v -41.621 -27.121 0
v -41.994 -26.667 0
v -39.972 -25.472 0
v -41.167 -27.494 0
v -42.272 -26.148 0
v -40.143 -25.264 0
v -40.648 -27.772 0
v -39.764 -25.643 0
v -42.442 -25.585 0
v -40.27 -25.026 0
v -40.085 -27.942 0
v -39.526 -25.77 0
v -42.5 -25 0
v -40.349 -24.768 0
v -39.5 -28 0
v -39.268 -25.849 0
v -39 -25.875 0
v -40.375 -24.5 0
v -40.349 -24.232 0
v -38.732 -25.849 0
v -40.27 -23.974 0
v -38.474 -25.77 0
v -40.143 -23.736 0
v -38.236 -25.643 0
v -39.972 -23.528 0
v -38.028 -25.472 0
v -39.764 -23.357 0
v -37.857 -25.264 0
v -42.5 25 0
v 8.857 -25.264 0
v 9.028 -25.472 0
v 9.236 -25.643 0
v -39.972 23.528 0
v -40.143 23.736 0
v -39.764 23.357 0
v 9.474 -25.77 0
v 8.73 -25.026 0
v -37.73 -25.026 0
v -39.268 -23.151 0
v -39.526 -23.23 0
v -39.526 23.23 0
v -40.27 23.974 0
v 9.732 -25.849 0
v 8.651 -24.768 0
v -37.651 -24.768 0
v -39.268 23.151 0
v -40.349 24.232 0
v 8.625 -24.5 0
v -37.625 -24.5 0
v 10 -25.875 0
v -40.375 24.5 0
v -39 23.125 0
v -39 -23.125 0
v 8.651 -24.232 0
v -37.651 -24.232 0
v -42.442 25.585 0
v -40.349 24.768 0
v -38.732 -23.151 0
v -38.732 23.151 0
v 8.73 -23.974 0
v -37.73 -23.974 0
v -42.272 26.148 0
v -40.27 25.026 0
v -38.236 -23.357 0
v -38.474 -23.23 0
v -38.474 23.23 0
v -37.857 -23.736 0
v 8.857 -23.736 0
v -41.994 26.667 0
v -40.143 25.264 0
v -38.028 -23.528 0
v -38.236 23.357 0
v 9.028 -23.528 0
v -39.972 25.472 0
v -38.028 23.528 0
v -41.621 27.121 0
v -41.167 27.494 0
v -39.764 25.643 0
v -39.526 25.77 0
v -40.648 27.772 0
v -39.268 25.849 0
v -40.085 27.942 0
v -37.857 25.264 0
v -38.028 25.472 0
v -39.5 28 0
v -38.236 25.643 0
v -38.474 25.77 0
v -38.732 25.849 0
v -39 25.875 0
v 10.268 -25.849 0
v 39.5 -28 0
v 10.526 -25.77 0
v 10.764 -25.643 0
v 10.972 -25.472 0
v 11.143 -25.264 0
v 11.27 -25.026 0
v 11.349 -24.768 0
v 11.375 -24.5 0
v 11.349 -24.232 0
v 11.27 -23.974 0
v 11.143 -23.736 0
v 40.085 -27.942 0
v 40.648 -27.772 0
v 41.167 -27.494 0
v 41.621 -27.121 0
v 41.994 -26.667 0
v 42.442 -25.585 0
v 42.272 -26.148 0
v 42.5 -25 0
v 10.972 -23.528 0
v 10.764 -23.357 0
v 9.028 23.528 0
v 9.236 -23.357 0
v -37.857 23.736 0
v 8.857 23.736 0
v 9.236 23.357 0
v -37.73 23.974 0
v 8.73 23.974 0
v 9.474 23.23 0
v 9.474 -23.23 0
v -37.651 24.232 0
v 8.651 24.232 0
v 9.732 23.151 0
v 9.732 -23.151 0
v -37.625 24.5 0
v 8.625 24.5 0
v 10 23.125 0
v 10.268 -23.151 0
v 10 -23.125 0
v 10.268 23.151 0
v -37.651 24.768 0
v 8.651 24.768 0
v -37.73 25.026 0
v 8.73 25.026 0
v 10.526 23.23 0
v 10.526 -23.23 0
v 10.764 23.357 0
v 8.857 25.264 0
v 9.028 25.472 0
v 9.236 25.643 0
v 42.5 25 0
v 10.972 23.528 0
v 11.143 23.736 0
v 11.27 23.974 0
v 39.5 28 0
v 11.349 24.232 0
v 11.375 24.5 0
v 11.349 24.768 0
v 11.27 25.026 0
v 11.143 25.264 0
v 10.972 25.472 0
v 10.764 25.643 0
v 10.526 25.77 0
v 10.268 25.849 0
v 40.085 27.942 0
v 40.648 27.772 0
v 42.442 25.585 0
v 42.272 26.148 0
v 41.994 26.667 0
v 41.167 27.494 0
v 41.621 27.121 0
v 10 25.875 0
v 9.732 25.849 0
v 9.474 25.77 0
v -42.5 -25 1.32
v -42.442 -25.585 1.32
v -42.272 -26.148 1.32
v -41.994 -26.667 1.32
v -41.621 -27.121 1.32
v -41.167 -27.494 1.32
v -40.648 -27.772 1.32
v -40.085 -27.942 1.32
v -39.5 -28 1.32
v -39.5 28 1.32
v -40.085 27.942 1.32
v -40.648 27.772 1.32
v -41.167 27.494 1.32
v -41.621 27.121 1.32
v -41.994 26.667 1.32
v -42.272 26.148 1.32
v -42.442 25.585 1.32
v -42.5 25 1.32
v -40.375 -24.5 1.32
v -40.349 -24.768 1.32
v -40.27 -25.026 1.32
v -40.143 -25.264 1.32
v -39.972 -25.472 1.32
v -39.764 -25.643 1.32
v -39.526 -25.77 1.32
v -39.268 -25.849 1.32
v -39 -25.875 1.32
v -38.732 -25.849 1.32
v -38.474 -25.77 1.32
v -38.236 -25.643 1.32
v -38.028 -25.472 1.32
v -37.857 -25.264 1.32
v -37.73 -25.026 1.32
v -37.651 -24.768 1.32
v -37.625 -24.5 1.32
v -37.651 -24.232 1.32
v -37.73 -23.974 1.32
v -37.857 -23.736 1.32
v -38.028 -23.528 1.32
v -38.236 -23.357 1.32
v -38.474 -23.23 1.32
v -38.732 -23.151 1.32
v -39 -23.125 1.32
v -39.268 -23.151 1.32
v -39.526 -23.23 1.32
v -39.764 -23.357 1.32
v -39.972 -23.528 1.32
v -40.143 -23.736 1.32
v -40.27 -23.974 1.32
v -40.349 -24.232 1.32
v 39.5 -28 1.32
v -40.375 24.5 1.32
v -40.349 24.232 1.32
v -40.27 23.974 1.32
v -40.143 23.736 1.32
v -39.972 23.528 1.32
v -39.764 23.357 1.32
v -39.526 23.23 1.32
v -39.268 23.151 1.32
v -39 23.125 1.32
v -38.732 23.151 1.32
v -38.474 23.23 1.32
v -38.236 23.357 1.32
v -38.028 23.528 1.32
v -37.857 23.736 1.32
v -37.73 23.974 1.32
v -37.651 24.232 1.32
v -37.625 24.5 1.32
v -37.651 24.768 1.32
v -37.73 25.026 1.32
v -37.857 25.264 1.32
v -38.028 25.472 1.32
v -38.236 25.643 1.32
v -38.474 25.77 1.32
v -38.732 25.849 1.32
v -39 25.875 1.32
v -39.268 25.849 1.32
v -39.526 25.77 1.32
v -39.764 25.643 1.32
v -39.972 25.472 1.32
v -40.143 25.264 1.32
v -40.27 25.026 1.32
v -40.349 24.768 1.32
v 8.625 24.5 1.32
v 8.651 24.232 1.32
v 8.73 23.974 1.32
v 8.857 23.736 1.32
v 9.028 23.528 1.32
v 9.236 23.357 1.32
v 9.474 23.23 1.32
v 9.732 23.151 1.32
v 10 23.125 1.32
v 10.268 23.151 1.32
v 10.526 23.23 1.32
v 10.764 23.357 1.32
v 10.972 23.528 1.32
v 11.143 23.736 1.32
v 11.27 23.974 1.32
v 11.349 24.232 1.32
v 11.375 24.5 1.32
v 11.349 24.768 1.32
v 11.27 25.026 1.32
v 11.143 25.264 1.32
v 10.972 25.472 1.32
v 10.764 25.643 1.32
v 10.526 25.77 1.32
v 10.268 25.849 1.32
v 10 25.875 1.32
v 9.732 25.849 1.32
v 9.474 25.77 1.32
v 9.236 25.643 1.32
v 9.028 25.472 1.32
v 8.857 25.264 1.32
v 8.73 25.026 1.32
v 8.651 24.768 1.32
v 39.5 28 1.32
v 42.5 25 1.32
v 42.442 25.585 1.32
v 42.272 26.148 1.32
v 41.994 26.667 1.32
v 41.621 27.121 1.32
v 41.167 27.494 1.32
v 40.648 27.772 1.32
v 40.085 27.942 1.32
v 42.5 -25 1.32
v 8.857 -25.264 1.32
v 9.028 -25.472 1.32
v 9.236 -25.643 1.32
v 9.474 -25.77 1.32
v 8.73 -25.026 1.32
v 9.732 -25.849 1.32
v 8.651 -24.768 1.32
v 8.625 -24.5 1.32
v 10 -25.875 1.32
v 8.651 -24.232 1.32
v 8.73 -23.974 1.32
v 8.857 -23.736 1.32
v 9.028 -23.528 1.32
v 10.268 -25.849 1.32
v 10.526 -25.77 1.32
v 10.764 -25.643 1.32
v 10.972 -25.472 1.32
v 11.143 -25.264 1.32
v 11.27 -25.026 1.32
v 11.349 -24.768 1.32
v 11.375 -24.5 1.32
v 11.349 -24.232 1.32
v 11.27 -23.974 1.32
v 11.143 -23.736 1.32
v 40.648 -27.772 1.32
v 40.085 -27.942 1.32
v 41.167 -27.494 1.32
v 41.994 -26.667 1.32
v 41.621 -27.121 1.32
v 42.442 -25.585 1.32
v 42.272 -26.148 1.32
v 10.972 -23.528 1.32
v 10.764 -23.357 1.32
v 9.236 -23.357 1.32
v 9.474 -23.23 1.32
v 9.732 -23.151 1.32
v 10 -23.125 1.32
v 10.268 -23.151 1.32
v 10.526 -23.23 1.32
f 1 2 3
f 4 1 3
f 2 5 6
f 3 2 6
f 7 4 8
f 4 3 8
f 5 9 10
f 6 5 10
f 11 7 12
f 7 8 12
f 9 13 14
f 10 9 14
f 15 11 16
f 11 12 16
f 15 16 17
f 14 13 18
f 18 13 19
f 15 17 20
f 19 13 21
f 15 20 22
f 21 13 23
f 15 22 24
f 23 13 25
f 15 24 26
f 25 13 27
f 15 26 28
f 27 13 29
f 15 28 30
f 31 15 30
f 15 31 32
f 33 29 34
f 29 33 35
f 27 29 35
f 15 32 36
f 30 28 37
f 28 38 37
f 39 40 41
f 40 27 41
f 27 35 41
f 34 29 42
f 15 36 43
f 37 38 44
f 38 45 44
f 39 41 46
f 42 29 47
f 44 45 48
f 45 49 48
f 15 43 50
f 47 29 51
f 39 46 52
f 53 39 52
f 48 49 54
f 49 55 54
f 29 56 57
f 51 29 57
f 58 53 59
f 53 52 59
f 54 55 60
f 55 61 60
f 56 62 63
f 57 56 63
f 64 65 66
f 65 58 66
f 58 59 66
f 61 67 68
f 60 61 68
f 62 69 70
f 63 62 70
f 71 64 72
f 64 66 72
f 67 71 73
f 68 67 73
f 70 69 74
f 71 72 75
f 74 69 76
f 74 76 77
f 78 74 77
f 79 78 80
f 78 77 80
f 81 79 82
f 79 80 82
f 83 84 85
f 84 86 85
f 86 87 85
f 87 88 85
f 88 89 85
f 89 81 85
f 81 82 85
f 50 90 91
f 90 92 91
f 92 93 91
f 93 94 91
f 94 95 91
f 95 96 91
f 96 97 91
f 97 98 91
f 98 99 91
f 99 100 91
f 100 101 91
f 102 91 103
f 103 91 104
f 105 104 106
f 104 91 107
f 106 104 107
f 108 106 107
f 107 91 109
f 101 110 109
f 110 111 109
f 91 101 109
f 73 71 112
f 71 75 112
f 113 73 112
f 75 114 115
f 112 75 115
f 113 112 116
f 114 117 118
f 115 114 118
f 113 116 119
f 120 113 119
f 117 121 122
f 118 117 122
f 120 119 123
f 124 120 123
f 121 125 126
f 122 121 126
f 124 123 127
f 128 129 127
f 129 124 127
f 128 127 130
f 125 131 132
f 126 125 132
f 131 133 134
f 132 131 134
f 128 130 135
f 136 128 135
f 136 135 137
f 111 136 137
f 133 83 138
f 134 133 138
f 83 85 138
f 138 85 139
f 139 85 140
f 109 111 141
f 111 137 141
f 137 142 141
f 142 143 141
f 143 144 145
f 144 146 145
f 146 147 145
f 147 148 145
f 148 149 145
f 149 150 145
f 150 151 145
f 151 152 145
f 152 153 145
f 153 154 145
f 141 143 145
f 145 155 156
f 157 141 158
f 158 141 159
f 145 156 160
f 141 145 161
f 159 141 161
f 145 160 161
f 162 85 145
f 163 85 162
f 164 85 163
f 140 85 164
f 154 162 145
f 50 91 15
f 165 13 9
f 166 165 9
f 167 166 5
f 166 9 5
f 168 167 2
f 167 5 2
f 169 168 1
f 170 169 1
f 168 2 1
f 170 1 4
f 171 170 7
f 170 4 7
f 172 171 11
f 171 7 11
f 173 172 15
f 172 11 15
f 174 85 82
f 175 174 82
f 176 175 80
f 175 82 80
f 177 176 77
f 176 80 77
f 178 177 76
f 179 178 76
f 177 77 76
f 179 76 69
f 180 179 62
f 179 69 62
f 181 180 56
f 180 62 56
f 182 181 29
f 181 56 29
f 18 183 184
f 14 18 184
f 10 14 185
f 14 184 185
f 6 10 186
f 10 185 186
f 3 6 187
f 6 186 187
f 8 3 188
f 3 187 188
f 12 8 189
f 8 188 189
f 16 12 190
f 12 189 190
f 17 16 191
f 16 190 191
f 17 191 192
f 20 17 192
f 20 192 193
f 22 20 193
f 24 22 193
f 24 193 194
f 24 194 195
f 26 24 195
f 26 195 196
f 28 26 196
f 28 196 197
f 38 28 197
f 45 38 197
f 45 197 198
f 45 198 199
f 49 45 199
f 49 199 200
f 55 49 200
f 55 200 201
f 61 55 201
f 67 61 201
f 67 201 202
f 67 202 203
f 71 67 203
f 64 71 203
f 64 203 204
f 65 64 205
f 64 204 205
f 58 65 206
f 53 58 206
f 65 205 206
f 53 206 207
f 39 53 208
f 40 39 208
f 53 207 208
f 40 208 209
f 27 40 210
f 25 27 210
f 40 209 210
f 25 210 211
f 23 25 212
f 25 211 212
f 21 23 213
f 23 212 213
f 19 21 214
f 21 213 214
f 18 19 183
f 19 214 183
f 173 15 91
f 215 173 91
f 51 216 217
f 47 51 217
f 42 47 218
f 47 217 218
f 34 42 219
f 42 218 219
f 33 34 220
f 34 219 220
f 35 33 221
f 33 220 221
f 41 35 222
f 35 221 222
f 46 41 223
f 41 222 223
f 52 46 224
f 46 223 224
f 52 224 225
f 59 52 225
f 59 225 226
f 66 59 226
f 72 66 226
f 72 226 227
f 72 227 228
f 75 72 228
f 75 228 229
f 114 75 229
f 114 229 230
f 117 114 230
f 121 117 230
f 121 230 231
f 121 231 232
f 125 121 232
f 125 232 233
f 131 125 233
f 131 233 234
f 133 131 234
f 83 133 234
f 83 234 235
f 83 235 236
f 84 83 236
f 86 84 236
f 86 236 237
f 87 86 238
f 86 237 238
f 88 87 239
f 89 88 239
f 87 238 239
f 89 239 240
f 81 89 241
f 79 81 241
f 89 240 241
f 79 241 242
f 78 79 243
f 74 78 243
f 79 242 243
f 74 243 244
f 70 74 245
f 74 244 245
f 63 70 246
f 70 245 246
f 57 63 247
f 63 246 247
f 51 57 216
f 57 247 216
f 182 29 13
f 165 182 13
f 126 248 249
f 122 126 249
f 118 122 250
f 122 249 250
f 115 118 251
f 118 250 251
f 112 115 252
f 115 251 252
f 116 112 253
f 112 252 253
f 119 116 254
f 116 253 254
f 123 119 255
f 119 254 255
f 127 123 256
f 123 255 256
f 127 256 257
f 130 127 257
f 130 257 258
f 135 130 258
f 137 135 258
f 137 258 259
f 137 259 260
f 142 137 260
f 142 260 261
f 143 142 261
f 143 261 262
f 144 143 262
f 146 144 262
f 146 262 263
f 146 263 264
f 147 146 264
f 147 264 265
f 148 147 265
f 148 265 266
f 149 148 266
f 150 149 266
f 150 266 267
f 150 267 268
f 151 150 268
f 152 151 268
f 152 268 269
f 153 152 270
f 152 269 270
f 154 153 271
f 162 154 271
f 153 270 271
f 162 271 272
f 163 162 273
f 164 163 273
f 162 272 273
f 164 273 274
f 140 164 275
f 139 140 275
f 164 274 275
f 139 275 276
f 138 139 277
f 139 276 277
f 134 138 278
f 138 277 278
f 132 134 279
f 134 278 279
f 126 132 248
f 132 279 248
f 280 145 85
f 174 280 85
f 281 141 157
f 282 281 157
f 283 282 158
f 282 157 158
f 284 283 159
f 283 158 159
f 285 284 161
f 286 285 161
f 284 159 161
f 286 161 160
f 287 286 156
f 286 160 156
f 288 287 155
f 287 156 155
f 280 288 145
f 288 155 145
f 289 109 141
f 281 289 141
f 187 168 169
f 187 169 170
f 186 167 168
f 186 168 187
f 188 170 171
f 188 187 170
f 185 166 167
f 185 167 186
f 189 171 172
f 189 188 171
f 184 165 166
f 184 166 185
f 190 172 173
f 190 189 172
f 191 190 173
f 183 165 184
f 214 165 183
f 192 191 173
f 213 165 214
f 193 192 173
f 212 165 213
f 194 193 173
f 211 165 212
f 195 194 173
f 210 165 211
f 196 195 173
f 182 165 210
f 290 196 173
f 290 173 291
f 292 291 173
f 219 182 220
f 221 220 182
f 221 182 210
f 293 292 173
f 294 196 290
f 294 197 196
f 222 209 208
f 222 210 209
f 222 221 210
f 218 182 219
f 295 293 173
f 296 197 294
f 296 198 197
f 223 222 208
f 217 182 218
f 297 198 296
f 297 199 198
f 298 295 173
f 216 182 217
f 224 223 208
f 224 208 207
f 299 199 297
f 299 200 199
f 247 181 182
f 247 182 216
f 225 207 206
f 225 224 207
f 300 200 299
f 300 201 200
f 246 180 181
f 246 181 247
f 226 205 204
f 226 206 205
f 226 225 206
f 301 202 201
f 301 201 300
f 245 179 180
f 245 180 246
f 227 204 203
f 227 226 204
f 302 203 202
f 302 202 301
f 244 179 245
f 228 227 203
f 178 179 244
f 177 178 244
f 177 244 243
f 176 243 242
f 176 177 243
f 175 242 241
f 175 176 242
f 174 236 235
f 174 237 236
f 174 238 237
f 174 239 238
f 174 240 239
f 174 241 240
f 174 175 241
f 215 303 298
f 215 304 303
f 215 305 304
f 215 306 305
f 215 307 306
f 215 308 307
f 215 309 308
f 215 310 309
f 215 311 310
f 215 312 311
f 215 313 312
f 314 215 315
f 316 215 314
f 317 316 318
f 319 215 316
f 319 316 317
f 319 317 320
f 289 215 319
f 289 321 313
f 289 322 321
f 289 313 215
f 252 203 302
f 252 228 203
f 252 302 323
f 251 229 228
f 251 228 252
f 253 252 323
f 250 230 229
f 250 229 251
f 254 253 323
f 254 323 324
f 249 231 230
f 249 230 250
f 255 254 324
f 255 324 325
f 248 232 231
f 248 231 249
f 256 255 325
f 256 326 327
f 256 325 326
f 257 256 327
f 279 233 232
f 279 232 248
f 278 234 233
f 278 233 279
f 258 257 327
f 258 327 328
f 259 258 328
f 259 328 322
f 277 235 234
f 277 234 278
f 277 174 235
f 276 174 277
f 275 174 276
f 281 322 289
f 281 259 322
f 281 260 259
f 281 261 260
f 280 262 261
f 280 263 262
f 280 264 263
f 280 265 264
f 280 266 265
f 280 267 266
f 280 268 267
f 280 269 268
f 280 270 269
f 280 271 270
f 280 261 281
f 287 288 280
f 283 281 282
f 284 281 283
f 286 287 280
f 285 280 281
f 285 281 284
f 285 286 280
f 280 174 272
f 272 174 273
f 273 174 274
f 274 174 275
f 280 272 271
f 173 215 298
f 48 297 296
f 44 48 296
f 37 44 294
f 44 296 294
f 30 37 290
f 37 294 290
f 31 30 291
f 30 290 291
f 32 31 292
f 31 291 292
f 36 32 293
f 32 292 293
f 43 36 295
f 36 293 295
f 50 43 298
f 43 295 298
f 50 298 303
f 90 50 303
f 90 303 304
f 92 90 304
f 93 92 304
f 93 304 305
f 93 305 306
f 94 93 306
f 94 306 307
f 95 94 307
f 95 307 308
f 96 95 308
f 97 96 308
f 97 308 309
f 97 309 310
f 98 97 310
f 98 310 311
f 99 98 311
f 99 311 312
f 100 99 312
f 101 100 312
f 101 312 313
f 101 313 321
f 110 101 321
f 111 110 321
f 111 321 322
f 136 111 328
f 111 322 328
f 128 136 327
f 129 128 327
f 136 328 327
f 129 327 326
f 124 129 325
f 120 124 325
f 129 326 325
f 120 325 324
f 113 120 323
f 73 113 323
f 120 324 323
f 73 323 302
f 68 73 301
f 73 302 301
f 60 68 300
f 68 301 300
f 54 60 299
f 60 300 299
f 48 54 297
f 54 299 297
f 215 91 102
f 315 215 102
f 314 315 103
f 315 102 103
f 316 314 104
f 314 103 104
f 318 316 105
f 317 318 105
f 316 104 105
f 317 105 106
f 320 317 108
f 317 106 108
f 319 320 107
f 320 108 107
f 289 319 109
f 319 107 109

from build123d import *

# Parameters (mm, degrees)
F1_DEPTH = 1.32
F2_D     = 2.75


with BuildPart() as f1:
    # F0 (on Top) → F1 (new body)
    with BuildSketch(Plane.XY):
        with BuildLine():
            ThreePointArc((42.5, 25), (41.62132, 27.12132), (39.5, 28))
            Line((39.5, 28), (-39.5, 28))
            ThreePointArc((-39.5, 28), (-41.62132, 27.12132), (-42.5, 25))
            Line((-42.5, 25), (-42.5, -25))
            ThreePointArc((-42.5, -25), (-41.62132, -27.12132), (-39.5, -28))
            Line((-39.5, -28), (39.5, -28))
            ThreePointArc((39.5, -28), (41.62132, -27.12132), (42.5, -25))
            Line((42.5, -25), (42.5, 25))
        make_face()
    extrude(amount=F1_DEPTH)

    # F2 (through all)
    with Locations(Plane(origin=(0, 0, 0), x_dir=(1, 0, 0), z_dir=(0, 0, -1))):
        with Locations((-39, 24.5), (10, 24.5), (10, -24.5), (-39, -24.5)):
            Hole(F2_D / 2)


solid = f1.part
